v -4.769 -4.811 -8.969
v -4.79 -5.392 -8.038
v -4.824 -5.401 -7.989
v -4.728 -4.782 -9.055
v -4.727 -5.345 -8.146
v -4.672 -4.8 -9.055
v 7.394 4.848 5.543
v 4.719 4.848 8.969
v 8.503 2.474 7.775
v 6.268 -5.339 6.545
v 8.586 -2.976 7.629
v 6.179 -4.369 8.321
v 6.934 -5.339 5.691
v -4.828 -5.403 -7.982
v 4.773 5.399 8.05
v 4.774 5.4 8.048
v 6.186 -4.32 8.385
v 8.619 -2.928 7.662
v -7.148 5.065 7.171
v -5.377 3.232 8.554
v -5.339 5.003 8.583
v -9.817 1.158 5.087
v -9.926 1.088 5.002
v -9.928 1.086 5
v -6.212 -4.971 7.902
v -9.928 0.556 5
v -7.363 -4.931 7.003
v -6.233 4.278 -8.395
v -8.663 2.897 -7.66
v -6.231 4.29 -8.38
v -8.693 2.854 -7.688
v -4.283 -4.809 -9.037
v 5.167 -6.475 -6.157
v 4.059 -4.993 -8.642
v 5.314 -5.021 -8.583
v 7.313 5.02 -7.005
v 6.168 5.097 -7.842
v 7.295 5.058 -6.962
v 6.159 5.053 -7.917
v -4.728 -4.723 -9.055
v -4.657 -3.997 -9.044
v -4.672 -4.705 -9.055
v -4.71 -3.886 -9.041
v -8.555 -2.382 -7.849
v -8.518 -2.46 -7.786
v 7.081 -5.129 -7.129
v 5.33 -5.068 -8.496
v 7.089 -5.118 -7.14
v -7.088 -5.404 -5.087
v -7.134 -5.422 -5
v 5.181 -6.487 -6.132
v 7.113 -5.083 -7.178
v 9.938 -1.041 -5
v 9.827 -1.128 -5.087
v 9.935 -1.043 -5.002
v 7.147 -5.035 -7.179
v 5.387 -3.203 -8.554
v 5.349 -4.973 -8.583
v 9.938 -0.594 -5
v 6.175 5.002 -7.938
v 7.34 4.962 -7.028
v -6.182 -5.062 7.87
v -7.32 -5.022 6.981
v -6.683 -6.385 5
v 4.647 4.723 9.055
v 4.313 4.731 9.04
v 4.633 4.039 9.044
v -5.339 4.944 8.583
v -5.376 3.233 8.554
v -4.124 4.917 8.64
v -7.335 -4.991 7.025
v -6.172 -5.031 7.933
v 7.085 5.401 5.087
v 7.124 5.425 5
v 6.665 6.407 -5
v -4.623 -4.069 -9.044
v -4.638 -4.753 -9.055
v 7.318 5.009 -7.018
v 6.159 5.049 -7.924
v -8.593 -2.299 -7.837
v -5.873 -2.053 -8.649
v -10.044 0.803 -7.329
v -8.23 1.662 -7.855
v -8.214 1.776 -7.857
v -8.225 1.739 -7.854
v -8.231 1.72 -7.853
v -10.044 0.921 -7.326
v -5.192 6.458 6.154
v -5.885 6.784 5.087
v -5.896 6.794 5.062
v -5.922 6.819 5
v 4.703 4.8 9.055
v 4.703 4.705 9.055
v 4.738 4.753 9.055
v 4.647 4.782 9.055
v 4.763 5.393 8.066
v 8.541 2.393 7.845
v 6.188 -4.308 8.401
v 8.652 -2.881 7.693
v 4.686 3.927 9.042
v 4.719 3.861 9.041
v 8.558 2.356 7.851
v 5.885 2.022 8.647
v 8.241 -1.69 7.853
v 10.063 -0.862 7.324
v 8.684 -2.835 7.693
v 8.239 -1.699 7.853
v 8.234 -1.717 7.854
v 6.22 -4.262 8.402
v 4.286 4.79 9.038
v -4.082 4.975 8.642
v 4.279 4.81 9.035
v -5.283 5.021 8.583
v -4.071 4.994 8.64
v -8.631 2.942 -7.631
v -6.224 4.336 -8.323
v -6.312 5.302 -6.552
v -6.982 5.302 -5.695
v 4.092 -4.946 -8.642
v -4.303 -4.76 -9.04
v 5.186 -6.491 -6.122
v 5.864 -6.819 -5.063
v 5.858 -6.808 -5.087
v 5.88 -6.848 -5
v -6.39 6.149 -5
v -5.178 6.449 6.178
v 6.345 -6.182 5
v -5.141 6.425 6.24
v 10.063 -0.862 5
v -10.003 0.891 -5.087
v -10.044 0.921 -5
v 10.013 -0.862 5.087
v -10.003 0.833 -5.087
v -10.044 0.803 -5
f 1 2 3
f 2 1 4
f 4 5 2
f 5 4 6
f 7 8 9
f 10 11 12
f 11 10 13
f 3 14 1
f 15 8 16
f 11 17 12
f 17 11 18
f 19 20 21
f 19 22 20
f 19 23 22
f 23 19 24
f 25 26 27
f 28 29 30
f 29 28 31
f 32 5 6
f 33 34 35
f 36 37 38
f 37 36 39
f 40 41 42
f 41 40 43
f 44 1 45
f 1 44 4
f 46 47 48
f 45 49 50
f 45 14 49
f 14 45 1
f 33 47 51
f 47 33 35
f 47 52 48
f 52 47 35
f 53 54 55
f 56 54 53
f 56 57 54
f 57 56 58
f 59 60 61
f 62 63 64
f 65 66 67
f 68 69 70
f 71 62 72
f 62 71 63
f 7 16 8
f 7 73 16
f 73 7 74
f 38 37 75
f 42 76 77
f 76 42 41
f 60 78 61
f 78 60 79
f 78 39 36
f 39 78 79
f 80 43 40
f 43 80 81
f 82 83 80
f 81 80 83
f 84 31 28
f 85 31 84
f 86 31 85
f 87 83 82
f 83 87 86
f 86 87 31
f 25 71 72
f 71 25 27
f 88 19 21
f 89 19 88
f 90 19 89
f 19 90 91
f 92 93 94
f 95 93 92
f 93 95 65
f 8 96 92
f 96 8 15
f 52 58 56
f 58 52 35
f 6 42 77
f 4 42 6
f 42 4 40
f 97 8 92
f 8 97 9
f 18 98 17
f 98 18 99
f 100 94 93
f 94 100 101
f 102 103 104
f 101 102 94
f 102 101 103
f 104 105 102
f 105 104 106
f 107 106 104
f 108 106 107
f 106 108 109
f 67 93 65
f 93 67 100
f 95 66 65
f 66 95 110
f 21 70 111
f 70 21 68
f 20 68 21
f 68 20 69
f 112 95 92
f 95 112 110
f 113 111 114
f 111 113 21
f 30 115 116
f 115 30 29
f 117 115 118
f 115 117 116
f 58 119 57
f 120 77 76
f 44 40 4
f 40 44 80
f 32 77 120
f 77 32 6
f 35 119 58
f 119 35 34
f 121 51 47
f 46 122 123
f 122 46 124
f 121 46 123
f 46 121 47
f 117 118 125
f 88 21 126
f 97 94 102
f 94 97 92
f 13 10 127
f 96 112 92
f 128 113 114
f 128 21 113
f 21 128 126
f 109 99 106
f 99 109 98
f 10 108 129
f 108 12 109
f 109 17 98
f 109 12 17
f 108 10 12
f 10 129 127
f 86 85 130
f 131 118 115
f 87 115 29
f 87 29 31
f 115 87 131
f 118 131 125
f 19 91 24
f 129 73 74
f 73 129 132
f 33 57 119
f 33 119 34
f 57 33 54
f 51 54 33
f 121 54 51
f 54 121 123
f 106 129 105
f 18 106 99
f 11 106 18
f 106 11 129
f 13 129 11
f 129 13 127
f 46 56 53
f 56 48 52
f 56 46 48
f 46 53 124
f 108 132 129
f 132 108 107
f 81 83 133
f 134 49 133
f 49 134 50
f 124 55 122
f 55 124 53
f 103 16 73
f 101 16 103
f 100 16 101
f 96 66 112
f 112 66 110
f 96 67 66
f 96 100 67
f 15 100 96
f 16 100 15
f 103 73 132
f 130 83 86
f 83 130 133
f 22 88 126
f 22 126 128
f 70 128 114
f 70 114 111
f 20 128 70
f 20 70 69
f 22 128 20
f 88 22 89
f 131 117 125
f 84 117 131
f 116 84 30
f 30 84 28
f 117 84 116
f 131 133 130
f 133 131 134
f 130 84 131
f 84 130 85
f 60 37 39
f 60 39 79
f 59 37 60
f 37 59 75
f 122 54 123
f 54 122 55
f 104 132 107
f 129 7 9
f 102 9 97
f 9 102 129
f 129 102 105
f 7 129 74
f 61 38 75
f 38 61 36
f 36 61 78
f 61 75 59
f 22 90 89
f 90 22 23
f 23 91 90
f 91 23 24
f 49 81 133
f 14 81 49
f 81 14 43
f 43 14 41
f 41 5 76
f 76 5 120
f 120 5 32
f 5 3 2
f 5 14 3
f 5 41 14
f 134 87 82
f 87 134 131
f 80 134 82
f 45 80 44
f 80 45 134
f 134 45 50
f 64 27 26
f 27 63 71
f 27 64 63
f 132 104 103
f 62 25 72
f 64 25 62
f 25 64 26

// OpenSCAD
// Auto-generated OpenSCAD file

    inner_points = 10*[[-0.5727942453287636, -0.8196991841635889, -0.49999999999979927], [0.572794245328764, 0.8196991841635887, 0.49999999999979927], [0.4234831942827272, -0.9059039596778707, 0.5000000000000533], [-0.42348319428272685, 0.9059039596778705, -0.5000000000000533], [0.9962774396112515, -0.08620477551448197, -0.5000000000001475], [-0.996277439611251, 0.08620477551448175, 0.5000000000001475], [0.9962774396114111, -0.08620477551434857, 0.49999999999985245], [-0.9962774396114107, 0.08620477551434835, -0.49999999999985245], [0.5727942453286043, 0.8196991841634554, -0.5000000000002008], [-0.5727942453286039, -0.8196991841634557, 0.5000000000002008], [0.42348319428256764, -0.905903959678004, -0.4999999999999469], [-0.4234831942825673, 0.9059039596780037, 0.4999999999999469], [0.5230238949797952, 0.24449813621619343, -1.3164965809278422], [-0.5230238949797947, -0.24449813621619365, 1.3164965809278422], [-0.049770350348888805, -0.5752010479473287, -1.3164965809276414], [0.04977035034888918, 0.5752010479473285, 1.3164965809276414], [-0.47325354463153607, 0.33070291173060856, -1.3164965809276947], [0.4732535446315364, -0.3307029117306088, 1.3164965809276947]];

    outer_points = 10*[[0.5298790273108971, -0.49733729572507634, -0.8496374701582584], [-0.5298790273108971, 0.49733729572507634, 0.8496374701582584], [-0.5206247255916664, -0.9885998081008317, -0.040253130631053124], [0.5206247255916664, 0.9885998081008317, 0.040253130631053124], [0.44745605235875646, -0.5243669819275101, 0.8802399385802442], [-0.44745605235875646, 0.5243669819275101, -0.8802399385802442], [-0.5511838178154568, -0.5022973355596736, 0.833002872544885], [0.5511838178154568, 0.5022973355596736, -0.833002872544885], [0.46876084286331626, 0.47526764935724, 0.8968745361936177], [-0.46876084286331626, -0.47526764935724, -0.8968745361936177], [0.4780151445825469, -1.010669454468668, 0.006983935404306196], [-0.4780151445825469, 1.010669454468668, -0.006983935404306196], [1.287231649678413, -0.038064509386351864, 0.6388132388414419], [-1.287231649678413, 0.038064509386351864, -0.6388132388414419], [1.3177907419022037, -0.5243669819275101, -0.23444276433449618], [-1.3177907419022037, 0.5243669819275101, 0.23444276433449618], [1.3390955324067635, 0.47526764935724, -0.2178081667211227], [-1.3390955324067635, -0.47526764935724, 0.2178081667211227]];

    // Convex hull for inner set (I)
    module inner_hull() {
        hull() {
            for (p = inner_points) {
                translate(p) sphere(r=0.1);
            }
        }
    }

    // Convex hull for outer set (O) minus inner hull (O \ I)
    module outer_minus_inner() {
        difference() {
            hull() {
                for (p = outer_points) {
                    translate(p) sphere(r=0.1);
                }
            }
            inner_hull(); // Subtract inner hull
        }
    }

    // Convex hull for outer set (O) minus all translated inner hulls
    module outer_minus_AllTranslationInner() {
        difference() {
            hull() {
                for (p = outer_points) {
                    translate(p) sphere(r=0.1);
                }
            }
            hull() {
                translate([0,0,50]) inner_hull();
                translate([0,0,-50]) inner_hull();
            }; // Subtract translated inner hulls
        }
    }

    // Difference between outer_minus_inner and outer_minus_AllTranslationInner
    module outer_minus_inner_diff() {
        difference() {
            // Outer minus inner
            difference() {
                hull() {
                    for (p = outer_points) {
                        translate(p) sphere(r=0.1);
                    }
                }
                inner_hull();
            }

            // Subtract Outer minus AllTranslationInner
            difference() {
                hull() {
                    for (p = outer_points) {
                        translate(p) sphere(r=0.1);
                    }
                }
                hull() {
                    translate([0,0,50]) inner_hull();
                    translate([0,0,-50]) inner_hull();
                };
            }
        }
    }

    // Rendering all with colors applied
    color([1, 1, 0, 1]) outer_minus_inner_diff(); // Opaque yellow
    
